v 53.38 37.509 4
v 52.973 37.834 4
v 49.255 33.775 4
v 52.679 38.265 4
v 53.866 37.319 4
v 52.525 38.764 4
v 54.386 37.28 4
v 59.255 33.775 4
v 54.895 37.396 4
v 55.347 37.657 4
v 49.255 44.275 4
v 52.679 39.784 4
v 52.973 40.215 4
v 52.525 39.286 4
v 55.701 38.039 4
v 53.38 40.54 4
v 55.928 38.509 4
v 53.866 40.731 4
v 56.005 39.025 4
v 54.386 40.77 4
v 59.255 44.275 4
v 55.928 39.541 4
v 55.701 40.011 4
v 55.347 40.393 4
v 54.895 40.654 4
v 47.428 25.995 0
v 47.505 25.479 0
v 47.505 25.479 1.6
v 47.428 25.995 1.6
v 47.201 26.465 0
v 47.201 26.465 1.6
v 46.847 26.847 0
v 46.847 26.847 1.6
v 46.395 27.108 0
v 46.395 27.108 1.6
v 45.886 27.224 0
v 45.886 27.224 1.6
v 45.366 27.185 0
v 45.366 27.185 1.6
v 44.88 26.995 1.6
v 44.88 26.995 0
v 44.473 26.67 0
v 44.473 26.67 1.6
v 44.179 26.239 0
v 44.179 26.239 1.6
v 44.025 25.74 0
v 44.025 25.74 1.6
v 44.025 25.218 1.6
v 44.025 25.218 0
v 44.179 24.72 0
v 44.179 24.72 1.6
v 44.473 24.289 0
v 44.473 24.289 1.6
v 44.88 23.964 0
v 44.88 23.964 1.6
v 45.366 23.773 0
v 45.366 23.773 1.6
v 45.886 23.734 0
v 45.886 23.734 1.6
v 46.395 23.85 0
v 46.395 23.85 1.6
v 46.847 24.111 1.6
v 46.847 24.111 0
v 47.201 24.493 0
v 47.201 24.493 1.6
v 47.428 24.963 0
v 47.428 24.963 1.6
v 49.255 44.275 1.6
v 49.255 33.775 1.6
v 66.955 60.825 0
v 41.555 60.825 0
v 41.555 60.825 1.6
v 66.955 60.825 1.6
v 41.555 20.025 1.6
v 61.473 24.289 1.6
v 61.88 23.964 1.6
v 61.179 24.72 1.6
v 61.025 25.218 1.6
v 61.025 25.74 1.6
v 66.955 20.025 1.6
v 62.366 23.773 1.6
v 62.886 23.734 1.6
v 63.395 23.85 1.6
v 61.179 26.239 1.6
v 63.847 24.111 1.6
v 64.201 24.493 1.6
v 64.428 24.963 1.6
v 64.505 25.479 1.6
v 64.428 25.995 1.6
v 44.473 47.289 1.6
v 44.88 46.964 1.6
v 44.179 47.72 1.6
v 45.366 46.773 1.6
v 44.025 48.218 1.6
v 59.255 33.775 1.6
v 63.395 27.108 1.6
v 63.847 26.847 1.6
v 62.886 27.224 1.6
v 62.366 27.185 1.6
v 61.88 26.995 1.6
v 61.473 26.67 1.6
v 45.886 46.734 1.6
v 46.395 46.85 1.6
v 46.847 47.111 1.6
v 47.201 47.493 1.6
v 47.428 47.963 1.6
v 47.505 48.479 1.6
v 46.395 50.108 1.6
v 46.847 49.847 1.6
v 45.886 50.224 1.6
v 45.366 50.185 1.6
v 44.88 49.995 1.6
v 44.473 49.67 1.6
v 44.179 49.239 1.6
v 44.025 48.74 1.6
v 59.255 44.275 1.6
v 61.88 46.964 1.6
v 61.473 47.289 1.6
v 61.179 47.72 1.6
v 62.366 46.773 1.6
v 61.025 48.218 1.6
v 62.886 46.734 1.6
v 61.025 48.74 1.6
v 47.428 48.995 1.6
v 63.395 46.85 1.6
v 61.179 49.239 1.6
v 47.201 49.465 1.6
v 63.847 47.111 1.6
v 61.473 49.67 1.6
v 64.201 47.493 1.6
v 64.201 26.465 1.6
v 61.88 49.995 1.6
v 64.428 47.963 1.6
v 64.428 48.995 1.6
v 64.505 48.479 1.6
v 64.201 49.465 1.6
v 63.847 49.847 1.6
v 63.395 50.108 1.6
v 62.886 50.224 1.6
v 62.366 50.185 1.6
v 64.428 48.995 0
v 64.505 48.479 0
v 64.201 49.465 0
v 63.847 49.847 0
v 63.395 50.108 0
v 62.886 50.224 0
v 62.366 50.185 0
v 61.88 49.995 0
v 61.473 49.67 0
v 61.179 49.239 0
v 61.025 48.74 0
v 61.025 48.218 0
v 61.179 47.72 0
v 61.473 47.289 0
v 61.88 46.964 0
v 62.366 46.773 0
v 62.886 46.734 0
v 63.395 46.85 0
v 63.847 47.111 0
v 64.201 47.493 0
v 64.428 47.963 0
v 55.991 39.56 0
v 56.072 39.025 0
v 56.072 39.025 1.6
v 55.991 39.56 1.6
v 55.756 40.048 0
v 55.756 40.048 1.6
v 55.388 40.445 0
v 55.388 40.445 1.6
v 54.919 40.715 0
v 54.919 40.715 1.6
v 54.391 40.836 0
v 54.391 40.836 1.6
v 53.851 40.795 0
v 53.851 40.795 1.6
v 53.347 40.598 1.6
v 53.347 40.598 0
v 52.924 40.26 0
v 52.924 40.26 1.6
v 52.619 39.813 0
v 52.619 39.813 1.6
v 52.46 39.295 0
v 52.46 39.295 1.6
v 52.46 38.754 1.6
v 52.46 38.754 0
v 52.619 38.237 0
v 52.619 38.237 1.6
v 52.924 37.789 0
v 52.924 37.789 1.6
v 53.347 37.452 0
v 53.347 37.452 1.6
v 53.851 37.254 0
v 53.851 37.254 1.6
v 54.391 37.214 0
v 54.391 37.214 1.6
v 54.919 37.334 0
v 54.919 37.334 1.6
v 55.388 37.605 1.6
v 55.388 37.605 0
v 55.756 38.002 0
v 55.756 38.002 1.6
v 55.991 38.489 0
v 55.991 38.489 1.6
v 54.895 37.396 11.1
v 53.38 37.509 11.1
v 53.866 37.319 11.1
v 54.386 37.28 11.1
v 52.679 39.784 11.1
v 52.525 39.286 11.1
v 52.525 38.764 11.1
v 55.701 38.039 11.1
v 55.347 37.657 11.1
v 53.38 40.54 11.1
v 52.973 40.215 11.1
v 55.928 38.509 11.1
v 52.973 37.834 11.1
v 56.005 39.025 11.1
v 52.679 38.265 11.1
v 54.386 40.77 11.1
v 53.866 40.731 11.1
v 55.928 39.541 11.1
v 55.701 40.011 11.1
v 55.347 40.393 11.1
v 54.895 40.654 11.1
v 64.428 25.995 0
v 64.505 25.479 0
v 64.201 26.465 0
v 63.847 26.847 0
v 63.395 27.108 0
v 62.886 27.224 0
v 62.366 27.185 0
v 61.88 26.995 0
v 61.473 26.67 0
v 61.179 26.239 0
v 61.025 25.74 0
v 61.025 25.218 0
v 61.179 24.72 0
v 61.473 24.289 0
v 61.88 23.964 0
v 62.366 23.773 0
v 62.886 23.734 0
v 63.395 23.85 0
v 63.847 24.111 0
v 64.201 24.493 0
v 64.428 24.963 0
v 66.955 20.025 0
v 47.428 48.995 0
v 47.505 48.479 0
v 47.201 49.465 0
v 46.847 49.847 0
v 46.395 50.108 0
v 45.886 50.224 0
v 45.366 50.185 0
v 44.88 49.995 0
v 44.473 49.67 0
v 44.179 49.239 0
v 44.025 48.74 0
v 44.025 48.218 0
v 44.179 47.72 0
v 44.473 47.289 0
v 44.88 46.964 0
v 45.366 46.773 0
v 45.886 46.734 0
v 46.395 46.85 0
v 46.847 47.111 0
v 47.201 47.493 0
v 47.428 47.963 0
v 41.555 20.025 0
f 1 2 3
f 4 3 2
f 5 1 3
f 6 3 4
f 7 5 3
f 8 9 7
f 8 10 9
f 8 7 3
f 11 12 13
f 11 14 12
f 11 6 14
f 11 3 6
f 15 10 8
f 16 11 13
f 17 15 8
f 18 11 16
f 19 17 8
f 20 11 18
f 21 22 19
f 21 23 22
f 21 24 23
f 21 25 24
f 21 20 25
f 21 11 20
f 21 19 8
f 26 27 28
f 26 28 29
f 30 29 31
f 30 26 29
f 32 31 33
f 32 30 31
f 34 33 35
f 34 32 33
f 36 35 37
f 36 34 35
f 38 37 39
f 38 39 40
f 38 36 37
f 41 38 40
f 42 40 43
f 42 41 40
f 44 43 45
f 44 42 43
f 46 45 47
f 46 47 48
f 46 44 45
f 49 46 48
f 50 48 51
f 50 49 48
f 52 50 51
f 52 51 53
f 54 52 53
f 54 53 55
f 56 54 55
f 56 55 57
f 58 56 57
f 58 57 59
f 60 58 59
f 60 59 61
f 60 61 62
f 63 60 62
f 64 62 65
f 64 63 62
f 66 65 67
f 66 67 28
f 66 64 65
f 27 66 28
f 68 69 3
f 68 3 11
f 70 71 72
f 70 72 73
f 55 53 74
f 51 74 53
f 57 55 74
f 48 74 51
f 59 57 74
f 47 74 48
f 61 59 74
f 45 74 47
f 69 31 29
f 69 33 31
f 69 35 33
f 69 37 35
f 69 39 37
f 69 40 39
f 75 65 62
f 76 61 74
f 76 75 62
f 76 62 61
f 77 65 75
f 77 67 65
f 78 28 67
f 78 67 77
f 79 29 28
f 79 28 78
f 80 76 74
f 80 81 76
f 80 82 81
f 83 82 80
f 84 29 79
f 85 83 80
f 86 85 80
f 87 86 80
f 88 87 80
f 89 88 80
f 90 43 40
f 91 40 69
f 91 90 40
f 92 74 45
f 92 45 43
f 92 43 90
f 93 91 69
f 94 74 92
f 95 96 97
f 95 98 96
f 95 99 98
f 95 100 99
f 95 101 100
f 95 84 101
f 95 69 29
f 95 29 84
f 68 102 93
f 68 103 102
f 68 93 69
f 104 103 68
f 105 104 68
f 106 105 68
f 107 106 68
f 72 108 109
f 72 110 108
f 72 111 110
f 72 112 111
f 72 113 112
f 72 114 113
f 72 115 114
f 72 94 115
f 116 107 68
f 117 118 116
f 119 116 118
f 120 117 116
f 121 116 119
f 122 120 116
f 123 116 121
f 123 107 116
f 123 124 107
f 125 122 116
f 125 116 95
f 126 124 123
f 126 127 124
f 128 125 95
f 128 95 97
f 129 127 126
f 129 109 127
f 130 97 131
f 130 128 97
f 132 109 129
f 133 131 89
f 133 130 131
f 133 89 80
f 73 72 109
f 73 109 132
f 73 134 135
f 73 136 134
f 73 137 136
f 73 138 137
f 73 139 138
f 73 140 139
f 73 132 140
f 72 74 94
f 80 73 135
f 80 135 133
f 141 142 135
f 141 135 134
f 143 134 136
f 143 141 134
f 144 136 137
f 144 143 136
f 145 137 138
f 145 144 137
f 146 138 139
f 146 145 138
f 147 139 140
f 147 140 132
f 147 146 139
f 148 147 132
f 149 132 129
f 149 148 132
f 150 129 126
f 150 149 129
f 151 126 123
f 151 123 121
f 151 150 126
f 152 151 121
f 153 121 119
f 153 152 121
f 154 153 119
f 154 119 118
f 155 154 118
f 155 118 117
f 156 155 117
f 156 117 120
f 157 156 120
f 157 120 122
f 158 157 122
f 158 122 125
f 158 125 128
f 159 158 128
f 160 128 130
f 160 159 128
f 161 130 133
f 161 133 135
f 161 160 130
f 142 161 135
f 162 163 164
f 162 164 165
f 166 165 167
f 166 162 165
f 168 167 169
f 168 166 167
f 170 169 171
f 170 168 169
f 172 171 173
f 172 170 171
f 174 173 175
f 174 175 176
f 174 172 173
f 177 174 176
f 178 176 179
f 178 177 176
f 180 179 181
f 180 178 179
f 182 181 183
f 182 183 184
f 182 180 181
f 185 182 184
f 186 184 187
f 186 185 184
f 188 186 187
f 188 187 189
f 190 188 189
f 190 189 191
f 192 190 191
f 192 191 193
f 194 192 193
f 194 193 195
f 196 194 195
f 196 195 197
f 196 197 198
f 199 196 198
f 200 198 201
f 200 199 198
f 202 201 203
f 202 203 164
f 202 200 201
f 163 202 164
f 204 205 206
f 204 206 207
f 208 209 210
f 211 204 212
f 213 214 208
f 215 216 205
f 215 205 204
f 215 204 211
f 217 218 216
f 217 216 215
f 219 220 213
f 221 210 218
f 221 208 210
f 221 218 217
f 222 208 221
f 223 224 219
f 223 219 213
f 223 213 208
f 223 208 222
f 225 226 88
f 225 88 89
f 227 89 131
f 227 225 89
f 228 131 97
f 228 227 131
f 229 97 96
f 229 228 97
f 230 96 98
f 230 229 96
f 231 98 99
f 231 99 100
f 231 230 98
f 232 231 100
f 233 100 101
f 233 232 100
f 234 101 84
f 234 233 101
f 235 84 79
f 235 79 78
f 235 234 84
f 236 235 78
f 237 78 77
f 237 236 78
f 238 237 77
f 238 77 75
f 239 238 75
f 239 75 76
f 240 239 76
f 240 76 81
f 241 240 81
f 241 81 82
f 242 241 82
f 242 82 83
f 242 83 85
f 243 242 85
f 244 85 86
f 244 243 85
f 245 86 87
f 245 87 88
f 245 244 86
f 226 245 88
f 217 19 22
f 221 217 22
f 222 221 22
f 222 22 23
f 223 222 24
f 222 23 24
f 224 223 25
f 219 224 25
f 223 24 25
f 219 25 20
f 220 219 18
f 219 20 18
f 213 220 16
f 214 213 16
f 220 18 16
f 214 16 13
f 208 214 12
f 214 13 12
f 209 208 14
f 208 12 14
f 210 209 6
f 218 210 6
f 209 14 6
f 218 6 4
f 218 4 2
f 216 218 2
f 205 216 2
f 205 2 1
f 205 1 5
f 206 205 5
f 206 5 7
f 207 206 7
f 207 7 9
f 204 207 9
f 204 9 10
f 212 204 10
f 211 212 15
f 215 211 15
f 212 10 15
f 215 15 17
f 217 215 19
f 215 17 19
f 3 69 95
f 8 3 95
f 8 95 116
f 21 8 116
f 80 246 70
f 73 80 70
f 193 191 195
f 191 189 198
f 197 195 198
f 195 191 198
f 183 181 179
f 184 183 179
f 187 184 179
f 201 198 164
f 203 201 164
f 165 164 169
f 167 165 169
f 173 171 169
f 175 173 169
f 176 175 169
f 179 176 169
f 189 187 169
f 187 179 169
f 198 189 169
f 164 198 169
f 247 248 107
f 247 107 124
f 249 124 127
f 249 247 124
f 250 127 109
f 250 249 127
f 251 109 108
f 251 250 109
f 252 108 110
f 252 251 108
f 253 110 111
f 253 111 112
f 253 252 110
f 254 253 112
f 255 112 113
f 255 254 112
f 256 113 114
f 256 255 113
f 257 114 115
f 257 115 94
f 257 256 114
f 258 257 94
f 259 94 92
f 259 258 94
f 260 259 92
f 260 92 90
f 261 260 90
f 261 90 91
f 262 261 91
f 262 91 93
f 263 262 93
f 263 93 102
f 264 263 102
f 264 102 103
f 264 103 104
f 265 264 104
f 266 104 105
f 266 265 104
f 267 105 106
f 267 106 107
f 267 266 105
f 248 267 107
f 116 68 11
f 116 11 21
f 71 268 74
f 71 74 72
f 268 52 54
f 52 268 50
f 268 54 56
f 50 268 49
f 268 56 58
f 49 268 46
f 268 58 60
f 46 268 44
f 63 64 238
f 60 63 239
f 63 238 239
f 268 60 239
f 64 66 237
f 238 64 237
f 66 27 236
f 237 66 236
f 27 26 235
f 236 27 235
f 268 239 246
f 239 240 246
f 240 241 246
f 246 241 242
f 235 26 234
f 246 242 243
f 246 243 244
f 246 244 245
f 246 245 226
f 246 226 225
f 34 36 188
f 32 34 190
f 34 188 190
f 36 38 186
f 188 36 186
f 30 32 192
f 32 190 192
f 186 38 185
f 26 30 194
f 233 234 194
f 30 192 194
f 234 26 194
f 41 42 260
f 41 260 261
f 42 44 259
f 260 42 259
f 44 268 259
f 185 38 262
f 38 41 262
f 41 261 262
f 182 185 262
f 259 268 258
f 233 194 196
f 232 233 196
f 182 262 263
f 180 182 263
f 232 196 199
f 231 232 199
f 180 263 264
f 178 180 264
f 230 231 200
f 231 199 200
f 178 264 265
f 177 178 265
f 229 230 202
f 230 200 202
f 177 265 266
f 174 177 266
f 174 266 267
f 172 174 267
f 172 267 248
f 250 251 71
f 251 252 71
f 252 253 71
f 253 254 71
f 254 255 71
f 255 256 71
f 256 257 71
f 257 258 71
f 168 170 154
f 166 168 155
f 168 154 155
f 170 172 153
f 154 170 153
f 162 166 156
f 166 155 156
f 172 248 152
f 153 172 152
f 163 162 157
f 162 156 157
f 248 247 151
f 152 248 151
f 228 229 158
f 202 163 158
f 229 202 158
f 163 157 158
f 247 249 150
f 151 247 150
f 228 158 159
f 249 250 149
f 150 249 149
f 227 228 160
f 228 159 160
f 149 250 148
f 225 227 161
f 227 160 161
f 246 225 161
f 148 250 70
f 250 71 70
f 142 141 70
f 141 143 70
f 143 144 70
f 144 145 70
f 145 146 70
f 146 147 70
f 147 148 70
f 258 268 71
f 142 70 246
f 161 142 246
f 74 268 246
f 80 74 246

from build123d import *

# Parameters (mm, degrees)
ESQUISSE1_W        = 25.4
ESQUISSE1_H        = 40.8
ESQUISSE1_R        = 1.75
ESQUISSE1_R_2      = 1.816105755
BOSS_EXTRU_1_DEPTH = 1.6
ESQUISSE2_W        = 10
ESQUISSE2_H        = 10.5
BOSS_EXTRU_2_DEPTH = 2.4
ESQUISSE3_R        = 1.75
BOSS_EXTRU_3_DEPTH = 7.1


with BuildPart() as part:
    # Esquisse1 → Boss.-Extru.1 (new body)
    with BuildSketch(Plane.XY):
        with Locations((54.255448742, 40.424731349)):
            Rectangle(ESQUISSE1_W, ESQUISSE1_H)
        with Locations((62.755448742, 25.479221209)):
            Circle(ESQUISSE1_R, mode=Mode.SUBTRACT)
        with Locations((45.755448742, 25.479221209)):
            Circle(ESQUISSE1_R, mode=Mode.SUBTRACT)
        with Locations((62.755448742, 48.479221209)):
            Circle(ESQUISSE1_R, mode=Mode.SUBTRACT)
        with Locations((45.755448742, 48.479221209)):
            Circle(ESQUISSE1_R, mode=Mode.SUBTRACT)
        with Locations((54.255448742, 39.024731349)):
            Circle(ESQUISSE1_R_2, mode=Mode.SUBTRACT)
    extrude(amount=BOSS_EXTRU_1_DEPTH)

    # Esquisse2 → Boss.-Extru.2 (add)
    with BuildSketch(Plane.XY.offset(1.6)):
        with Locations((54.255448742, 39.024731349)):
            Rectangle(ESQUISSE2_W, ESQUISSE2_H)
    extrude(amount=BOSS_EXTRU_2_DEPTH)

    # Esquisse3 → Boss.-Extru.3 (add)
    with BuildSketch(Plane.XY.offset(4)):
        with Locations((54.255448742, 39.024731349)):
            Circle(ESQUISSE3_R)
    extrude(amount=BOSS_EXTRU_3_DEPTH)


solid = part.part
